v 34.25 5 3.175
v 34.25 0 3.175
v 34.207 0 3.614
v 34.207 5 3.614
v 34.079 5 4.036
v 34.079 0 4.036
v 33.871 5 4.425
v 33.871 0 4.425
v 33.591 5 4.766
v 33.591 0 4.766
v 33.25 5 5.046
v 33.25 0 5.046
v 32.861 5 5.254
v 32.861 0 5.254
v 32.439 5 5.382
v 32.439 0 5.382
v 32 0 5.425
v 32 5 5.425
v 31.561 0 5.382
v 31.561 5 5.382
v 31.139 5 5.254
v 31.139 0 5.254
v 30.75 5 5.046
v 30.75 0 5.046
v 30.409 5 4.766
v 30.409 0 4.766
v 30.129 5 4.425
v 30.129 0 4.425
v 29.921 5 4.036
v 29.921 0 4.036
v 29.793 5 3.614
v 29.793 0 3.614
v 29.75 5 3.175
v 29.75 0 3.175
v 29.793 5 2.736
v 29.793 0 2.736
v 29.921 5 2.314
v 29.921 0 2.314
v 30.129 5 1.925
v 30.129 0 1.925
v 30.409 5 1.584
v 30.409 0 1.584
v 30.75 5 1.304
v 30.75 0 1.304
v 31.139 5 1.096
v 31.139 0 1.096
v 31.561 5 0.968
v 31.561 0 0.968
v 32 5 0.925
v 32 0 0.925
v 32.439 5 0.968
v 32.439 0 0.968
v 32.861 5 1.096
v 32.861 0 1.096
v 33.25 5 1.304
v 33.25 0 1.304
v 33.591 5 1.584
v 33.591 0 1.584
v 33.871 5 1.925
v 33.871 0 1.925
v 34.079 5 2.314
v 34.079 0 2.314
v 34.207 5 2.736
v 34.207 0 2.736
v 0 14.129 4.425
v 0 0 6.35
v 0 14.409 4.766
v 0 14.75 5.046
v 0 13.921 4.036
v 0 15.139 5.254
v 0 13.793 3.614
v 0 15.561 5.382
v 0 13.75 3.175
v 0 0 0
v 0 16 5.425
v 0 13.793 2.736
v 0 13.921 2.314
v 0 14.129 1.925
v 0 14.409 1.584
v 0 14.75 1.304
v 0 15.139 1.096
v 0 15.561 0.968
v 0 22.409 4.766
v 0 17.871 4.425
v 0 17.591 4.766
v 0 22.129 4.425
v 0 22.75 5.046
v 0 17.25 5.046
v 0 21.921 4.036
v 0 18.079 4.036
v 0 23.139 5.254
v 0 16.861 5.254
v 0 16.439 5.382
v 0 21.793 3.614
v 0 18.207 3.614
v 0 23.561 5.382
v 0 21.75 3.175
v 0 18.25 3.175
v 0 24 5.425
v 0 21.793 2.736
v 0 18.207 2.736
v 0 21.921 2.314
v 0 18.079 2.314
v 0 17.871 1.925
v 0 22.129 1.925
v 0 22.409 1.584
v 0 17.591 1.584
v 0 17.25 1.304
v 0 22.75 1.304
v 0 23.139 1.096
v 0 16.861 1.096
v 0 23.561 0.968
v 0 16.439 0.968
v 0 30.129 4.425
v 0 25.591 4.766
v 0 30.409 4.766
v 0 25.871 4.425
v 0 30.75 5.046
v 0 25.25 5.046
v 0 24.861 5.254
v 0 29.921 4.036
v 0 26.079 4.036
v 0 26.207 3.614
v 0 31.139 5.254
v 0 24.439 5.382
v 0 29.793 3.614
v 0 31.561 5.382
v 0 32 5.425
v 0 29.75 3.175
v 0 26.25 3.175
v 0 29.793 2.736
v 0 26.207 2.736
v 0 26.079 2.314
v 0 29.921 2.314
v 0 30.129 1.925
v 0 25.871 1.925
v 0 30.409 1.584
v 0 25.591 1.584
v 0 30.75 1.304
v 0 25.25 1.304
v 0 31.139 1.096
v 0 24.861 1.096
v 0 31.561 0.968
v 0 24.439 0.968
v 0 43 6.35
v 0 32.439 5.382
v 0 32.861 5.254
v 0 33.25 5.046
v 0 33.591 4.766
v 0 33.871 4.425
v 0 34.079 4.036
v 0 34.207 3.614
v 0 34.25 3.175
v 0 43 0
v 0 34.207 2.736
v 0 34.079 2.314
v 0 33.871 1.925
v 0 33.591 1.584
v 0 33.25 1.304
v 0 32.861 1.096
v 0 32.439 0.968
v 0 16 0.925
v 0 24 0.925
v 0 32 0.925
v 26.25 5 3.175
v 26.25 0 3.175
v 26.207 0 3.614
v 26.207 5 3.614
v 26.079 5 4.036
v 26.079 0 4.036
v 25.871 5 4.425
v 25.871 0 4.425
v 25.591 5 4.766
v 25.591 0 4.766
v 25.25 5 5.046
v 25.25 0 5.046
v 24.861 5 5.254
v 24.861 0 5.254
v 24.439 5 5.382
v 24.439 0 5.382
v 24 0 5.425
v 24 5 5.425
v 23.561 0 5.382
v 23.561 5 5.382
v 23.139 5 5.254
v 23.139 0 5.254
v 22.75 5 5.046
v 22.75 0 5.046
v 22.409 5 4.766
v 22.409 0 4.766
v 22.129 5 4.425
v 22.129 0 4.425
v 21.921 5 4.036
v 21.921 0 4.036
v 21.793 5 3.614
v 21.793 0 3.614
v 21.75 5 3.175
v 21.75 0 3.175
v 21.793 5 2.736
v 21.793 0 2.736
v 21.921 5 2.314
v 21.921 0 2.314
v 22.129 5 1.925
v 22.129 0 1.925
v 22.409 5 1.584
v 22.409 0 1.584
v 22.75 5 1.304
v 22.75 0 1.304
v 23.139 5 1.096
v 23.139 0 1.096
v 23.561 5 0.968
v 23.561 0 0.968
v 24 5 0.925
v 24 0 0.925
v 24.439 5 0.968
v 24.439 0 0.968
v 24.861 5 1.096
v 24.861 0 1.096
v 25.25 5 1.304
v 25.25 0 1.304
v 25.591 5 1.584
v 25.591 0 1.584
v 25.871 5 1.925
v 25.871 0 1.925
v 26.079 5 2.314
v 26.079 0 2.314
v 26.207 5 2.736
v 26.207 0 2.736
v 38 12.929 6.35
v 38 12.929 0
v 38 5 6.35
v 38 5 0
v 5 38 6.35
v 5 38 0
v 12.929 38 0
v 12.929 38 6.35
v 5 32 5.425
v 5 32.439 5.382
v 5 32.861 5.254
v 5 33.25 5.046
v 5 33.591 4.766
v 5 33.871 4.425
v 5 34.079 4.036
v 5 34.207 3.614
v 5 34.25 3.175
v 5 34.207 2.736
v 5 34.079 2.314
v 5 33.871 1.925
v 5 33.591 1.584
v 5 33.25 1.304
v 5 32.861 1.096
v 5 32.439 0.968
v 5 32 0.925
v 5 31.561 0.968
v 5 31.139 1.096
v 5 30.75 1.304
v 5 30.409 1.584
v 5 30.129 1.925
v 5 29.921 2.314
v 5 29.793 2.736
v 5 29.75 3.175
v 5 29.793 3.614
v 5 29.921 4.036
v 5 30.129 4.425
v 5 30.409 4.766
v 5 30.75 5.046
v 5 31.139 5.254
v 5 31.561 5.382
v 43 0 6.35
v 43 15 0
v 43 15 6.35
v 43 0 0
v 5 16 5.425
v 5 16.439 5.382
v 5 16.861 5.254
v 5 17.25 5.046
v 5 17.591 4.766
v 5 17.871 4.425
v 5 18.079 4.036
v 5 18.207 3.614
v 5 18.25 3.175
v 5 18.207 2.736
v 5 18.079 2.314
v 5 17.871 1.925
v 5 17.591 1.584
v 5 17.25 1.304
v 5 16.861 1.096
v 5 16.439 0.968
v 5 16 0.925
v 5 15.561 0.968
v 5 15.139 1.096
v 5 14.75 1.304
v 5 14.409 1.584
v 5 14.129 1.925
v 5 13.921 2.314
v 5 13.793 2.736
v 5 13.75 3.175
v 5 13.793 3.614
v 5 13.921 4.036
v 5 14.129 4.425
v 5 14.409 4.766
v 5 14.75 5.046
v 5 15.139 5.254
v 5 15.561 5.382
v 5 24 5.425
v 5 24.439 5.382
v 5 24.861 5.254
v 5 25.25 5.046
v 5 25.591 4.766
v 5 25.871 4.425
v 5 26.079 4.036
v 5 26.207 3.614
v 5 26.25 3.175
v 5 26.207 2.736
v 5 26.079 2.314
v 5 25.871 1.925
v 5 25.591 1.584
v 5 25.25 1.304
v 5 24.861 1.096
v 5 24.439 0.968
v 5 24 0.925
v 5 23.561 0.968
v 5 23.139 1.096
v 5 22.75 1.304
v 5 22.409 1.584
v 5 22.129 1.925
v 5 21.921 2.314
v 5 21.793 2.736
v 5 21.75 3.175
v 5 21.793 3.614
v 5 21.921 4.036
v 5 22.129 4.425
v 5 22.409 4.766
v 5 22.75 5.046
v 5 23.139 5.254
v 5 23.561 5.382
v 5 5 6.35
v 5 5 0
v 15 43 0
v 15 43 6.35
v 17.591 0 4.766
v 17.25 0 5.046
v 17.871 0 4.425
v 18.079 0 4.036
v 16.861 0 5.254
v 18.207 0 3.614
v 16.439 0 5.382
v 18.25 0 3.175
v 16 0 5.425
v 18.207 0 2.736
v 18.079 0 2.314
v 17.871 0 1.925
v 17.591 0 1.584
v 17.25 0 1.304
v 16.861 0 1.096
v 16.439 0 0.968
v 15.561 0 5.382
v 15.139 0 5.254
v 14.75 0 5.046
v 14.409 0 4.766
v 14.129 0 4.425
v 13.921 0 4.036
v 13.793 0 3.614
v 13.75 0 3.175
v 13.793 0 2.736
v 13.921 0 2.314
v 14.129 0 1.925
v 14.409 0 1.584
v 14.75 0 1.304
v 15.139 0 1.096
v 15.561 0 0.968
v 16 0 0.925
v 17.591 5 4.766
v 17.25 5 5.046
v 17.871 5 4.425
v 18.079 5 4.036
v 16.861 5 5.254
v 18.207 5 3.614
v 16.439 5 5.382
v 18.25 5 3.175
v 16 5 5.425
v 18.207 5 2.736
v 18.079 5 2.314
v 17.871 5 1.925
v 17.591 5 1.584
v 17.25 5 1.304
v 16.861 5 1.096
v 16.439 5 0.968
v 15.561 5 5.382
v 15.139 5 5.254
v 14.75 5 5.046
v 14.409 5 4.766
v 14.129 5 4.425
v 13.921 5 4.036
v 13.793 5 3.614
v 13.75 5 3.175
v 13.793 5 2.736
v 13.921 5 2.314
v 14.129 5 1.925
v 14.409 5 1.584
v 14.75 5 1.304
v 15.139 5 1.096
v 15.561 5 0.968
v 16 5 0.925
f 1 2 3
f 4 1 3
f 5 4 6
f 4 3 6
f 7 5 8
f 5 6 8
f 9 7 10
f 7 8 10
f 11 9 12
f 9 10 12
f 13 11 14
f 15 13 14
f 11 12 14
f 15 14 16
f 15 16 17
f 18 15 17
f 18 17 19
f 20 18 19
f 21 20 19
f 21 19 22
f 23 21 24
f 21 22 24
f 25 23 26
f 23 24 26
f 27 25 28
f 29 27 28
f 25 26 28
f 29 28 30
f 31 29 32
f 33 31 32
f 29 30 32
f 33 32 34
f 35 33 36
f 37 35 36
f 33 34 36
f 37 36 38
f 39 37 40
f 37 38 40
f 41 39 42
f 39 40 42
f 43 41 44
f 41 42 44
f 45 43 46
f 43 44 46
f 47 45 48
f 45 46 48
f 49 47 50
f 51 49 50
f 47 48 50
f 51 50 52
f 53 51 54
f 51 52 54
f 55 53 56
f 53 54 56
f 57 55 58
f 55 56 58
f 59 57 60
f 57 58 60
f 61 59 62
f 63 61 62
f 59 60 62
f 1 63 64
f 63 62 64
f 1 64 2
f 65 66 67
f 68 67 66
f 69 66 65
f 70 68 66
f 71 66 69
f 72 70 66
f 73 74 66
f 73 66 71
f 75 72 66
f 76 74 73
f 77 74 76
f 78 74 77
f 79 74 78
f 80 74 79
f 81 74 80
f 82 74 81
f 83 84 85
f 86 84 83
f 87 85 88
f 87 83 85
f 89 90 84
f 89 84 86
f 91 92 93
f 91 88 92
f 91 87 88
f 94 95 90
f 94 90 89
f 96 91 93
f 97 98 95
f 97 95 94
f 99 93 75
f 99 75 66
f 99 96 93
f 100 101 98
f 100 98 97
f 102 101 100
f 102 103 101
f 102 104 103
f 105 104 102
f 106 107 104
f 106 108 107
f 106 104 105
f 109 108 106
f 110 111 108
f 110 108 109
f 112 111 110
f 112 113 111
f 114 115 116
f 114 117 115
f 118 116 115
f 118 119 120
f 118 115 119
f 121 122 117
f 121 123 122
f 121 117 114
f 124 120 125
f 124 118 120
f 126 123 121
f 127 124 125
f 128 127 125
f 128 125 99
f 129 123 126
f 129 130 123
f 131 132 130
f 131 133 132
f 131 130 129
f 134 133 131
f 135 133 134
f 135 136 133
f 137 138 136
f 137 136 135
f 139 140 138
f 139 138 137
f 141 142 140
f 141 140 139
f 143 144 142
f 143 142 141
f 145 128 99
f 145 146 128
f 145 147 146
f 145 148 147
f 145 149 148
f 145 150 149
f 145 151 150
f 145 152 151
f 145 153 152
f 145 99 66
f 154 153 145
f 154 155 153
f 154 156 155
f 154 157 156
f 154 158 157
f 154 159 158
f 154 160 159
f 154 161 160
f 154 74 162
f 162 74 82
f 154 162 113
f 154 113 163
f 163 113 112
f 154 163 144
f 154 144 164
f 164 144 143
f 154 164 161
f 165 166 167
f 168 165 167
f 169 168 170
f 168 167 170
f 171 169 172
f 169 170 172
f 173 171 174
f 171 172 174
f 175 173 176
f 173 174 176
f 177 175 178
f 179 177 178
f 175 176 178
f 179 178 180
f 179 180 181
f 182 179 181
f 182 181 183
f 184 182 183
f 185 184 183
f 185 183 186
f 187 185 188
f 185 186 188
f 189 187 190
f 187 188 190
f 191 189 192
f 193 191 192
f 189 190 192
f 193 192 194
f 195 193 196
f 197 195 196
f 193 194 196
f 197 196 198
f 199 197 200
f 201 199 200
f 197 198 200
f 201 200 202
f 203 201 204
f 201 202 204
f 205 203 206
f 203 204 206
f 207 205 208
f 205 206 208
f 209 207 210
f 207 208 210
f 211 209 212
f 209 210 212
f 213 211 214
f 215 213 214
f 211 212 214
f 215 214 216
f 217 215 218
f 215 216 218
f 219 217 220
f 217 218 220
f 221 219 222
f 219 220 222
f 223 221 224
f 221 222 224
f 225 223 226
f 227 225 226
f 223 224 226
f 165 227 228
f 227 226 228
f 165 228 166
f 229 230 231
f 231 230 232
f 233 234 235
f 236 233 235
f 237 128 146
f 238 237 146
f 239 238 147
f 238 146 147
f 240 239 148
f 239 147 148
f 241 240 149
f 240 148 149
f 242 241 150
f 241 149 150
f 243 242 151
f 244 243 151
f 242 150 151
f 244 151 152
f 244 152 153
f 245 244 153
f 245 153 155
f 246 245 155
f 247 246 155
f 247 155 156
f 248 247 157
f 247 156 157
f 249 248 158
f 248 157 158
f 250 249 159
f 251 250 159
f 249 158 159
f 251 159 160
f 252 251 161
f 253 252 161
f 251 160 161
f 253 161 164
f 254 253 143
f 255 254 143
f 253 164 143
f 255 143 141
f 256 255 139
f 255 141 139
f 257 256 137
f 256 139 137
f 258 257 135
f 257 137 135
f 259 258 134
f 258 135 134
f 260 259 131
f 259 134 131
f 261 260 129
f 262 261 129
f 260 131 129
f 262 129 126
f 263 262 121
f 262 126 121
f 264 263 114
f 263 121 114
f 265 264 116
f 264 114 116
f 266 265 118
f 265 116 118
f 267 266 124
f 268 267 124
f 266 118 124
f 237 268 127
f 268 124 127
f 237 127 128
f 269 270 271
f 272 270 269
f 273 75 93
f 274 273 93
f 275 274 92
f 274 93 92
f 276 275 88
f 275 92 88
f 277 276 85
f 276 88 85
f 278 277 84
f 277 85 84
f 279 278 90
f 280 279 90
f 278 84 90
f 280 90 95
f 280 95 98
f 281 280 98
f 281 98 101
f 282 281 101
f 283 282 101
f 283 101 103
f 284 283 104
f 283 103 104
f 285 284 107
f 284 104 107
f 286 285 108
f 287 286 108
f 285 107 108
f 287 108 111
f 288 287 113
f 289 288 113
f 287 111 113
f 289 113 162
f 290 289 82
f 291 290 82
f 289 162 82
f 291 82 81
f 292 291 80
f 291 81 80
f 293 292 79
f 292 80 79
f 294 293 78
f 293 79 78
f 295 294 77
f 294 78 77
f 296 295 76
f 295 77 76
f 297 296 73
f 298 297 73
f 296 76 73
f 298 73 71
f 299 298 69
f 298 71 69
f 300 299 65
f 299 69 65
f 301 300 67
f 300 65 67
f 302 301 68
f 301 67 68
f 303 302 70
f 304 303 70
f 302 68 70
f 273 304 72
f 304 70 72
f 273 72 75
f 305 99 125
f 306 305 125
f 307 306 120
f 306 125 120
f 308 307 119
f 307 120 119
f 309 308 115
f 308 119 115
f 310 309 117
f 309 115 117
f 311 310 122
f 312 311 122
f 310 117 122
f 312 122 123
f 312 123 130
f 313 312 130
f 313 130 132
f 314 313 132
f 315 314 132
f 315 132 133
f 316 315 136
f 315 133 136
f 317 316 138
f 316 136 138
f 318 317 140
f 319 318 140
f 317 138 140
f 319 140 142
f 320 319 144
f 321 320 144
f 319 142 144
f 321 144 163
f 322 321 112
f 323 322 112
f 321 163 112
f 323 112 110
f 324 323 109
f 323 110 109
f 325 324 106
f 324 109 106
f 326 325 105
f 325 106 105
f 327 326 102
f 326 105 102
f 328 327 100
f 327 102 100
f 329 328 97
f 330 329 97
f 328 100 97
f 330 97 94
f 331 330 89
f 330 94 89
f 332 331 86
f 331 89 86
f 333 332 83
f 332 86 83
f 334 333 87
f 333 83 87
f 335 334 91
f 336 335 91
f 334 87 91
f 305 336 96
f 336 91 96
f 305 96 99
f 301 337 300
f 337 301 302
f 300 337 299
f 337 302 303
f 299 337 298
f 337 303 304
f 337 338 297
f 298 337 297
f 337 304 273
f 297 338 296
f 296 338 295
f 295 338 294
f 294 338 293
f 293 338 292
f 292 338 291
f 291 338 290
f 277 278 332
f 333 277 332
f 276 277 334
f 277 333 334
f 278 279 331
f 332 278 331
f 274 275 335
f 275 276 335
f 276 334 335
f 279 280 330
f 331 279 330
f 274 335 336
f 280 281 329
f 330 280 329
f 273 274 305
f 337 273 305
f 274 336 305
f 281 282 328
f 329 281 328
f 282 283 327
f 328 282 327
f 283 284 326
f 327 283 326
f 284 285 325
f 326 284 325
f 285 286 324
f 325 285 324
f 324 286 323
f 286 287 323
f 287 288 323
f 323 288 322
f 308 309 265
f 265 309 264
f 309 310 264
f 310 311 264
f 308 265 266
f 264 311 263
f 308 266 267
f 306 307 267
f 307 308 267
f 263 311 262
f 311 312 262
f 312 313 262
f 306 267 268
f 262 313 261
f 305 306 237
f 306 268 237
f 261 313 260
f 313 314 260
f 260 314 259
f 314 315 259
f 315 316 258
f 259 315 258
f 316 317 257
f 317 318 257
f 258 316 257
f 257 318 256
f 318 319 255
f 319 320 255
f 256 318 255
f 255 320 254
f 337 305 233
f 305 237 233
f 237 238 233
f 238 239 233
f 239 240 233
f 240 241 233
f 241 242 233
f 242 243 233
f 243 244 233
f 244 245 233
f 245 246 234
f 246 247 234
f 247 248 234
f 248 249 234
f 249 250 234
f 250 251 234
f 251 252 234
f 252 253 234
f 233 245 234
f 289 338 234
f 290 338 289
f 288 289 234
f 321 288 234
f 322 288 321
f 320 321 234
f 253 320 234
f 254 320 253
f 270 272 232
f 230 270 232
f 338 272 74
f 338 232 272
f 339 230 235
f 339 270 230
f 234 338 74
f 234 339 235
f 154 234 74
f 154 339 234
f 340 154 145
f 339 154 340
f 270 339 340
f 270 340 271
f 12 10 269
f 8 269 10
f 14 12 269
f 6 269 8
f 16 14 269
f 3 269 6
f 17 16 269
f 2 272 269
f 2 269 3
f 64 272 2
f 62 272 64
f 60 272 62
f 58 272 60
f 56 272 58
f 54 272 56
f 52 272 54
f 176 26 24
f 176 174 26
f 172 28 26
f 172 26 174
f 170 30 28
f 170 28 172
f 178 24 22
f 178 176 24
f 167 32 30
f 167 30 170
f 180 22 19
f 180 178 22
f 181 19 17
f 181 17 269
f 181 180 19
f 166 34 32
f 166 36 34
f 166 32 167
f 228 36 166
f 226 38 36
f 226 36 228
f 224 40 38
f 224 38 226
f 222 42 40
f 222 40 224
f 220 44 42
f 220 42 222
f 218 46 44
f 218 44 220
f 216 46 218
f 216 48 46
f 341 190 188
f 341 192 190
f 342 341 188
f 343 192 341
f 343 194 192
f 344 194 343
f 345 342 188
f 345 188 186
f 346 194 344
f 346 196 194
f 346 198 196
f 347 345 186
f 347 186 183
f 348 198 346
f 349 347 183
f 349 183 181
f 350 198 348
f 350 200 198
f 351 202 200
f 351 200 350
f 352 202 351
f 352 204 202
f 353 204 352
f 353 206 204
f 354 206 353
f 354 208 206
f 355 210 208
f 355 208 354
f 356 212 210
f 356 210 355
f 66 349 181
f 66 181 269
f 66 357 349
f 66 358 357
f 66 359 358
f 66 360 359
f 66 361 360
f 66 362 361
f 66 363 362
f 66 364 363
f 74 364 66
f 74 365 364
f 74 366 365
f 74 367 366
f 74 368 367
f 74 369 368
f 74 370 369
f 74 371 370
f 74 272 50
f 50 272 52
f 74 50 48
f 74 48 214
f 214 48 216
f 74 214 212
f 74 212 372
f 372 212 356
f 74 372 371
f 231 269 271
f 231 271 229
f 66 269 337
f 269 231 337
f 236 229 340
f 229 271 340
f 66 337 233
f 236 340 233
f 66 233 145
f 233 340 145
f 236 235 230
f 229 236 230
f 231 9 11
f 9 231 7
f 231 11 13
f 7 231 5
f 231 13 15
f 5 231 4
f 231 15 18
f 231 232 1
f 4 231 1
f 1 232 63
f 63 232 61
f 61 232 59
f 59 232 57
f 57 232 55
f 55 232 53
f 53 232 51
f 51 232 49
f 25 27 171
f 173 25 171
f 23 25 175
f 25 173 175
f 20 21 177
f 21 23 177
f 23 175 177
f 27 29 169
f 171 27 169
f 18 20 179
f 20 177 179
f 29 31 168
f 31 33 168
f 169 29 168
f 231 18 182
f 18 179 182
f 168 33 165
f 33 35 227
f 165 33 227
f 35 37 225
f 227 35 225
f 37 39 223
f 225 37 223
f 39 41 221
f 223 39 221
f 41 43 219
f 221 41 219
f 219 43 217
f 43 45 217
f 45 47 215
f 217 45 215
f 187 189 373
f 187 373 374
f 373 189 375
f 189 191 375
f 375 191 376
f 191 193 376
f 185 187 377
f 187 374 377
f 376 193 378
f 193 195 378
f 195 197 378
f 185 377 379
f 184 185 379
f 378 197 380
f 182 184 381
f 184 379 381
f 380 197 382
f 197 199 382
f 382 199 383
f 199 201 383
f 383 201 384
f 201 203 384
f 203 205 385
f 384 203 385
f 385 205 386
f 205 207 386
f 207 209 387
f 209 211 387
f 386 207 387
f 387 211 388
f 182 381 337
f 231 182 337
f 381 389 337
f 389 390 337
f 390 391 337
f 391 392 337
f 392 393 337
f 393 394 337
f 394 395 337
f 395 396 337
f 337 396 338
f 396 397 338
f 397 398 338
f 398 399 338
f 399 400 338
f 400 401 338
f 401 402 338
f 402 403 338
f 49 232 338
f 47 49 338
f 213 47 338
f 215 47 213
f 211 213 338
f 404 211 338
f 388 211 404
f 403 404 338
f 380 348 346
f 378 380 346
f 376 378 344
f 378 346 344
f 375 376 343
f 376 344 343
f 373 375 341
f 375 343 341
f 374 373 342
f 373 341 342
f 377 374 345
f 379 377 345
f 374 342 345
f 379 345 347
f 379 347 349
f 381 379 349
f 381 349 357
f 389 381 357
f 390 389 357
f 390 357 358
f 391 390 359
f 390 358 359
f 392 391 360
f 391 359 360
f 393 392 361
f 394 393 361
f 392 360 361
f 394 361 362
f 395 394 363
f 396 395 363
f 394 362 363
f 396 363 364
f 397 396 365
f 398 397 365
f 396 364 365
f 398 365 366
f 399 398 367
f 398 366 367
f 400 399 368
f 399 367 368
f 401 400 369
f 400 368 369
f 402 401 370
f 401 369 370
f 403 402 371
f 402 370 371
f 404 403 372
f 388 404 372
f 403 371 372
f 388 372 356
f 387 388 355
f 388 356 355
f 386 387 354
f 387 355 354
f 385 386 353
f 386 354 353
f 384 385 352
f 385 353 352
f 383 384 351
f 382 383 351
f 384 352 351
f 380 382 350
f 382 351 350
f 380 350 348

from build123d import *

# Parameters (mm, degrees)
BOSS_EXTRUDE1_DEPTH = 6.35
SKETCH2_R           = 2.25
CUT_EXTRUDE1_DEPTH  = 5
SKETCH3_R           = 2.25
CUT_EXTRUDE2_DEPTH  = 5


with BuildPart() as part:
    # Sketch1 → Boss-Extrude1 (new body)
    with BuildSketch(Plane.XY):
        Polygon((0, 0), (0, 43), (15, 43), (43, 15), (43, 0), align=None)
        Polygon((38, 5), (5, 5), (5, 38), (12.928932188, 38), (38, 12.928932188), align=None, mode=Mode.SUBTRACT)
    extrude(amount=BOSS_EXTRUDE1_DEPTH)

    # Sketch2 → Cut-Extrude1 (cut)
    with BuildSketch(Plane.XZ):
        with Locations((16, 3.175)):
            Circle(SKETCH2_R)
        with Locations((24, 3.175)):
            Circle(SKETCH2_R)
        with Locations((32, 3.175)):
            Circle(SKETCH2_R)
    extrude(amount=-CUT_EXTRUDE1_DEPTH, mode=Mode.SUBTRACT)

    # Sketch3 → Cut-Extrude2 (cut)
    with BuildSketch(Plane.ZY):
        with Locations((3.175, 16)):
            Circle(SKETCH3_R)
        with Locations((3.175, 24)):
            Circle(SKETCH3_R)
        with Locations((3.175, 32)):
            Circle(SKETCH3_R)
    extrude(amount=-CUT_EXTRUDE2_DEPTH, mode=Mode.SUBTRACT)


solid = part.part
